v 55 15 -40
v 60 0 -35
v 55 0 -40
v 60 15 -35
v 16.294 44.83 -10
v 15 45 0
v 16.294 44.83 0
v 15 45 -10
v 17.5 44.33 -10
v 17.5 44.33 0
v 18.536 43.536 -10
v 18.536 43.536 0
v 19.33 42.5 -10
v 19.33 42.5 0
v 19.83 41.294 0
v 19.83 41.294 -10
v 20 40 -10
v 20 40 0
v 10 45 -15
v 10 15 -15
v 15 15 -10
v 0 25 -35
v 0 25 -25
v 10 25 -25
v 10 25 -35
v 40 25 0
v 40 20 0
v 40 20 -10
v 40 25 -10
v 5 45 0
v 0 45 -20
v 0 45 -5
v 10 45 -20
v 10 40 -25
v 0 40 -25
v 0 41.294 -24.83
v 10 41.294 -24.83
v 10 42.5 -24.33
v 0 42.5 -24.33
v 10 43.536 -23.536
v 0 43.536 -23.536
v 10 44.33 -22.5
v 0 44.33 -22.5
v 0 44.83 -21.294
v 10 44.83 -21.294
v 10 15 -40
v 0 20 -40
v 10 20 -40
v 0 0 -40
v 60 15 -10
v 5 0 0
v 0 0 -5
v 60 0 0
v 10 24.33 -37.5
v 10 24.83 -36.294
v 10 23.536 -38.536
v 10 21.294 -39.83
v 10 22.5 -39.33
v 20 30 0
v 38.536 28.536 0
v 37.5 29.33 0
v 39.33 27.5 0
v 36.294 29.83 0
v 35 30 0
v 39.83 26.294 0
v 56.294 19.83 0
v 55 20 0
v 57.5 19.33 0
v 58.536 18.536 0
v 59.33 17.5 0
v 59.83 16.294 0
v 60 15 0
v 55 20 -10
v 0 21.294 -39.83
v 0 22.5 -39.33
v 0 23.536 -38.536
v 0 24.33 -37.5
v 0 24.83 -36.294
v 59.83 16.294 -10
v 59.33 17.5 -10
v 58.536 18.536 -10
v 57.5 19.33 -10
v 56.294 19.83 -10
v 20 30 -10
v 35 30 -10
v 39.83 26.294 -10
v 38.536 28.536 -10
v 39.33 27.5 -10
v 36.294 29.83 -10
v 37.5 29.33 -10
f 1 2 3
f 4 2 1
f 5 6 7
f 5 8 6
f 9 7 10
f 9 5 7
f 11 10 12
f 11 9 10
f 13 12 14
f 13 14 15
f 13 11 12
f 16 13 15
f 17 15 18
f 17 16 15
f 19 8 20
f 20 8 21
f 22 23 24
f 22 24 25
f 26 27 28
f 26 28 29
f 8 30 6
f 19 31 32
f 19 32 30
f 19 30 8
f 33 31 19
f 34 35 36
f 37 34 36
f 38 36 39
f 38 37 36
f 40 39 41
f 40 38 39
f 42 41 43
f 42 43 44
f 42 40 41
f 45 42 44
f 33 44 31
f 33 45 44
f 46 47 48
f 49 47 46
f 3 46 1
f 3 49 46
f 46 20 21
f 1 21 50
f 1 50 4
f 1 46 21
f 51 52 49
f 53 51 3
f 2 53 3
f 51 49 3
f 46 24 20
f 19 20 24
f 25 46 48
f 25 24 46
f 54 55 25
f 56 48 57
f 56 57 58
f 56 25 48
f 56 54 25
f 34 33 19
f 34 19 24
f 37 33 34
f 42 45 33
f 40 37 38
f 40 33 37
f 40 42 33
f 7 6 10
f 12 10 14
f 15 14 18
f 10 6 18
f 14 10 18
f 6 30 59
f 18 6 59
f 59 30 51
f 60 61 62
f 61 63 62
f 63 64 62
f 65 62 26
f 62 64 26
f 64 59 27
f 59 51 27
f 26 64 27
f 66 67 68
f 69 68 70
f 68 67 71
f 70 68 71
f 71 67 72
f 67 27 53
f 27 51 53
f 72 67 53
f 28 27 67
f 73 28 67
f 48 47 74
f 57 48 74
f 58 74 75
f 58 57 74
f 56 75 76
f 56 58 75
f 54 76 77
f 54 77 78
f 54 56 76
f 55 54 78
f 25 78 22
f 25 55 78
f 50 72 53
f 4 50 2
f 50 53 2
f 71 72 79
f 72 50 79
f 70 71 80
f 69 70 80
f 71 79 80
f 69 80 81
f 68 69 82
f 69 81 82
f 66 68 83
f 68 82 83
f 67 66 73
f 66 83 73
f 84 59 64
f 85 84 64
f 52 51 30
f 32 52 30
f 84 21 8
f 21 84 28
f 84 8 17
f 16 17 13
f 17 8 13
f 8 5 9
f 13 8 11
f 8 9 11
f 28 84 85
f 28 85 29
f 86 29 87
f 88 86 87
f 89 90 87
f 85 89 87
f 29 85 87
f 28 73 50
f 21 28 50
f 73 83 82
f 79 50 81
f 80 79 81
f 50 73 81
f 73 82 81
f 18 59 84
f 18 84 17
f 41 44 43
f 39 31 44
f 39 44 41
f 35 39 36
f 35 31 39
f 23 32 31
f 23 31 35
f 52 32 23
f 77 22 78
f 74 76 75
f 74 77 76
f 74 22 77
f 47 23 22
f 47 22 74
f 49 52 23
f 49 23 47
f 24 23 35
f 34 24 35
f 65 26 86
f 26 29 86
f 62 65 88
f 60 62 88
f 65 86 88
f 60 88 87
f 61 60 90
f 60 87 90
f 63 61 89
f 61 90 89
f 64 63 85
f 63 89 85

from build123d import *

# Parameters (mm, degrees)
SKETCH1_W           = 60
SKETCH1_H           = 40
BOSS_EXTRUDE1_DEPTH = 45
CUT_EXTRUDE1_START  = 45
SKETCH1_3_W         = 50
SKETCH1_3_H         = 30
CUT_EXTRUDE1_DEPTH  = 30
SKETCH2_W           = 40
SKETCH2_H           = 15
SKETCH2_W_2         = 20
SKETCH2_H_2         = 10
CUT_EXTRUDE2_DEPTH  = 30
SKETCH3_W           = 15
SKETCH3_H           = 20
CUT_EXTRUDE3_DEPTH  = 30
FILLET1_R           = 5
CHAMFER2_SIZE       = 5


with BuildPart() as part:
    # Sketch1 → Boss-Extrude1 (new body)
    with BuildSketch(Plane(origin=(0, 0, 0), x_dir=(1, 0, 0), z_dir=(0, 1, 0))):
        with Locations((30, 20)):
            Rectangle(SKETCH1_W, SKETCH1_H)
    extrude(amount=BOSS_EXTRUDE1_DEPTH)

    # Sketch1<3> → Cut-Extrude1 (cut)
    with BuildSketch(Plane(origin=(0, 0, 0), x_dir=(1, 0, 0), z_dir=(0, 1, 0)).offset(CUT_EXTRUDE1_START)):
        with Locations((35, 25)):
            Rectangle(SKETCH1_3_W, SKETCH1_3_H)
    extrude(amount=-CUT_EXTRUDE1_DEPTH, mode=Mode.SUBTRACT)

    # Sketch2 → Cut-Extrude2 (cut)
    with BuildSketch(Plane.XY):
        with Locations((40, 37.5)):
            Rectangle(SKETCH2_W, SKETCH2_H)
        with Locations((50, 25)):
            Rectangle(SKETCH2_W_2, SKETCH2_H_2)
    extrude(amount=-CUT_EXTRUDE2_DEPTH, mode=Mode.SUBTRACT)

    # Sketch3 → Cut-Extrude3 (cut)
    with BuildSketch(Plane(origin=(0, 0, 0), x_dir=(0, 0, -1), z_dir=(1, 0, 0))):
        with Locations((32.5, 35)):
            Rectangle(SKETCH3_W, SKETCH3_H)
    extrude(amount=CUT_EXTRUDE3_DEPTH, mode=Mode.SUBTRACT)

    # Fillet1
    fillet1_edges = [part.edges().sort_by_distance(p)[0] for p in [
        (5, 25, -40),
        (5, 45, -25),
        (20, 45, -5),
        (40, 30, -5),
        (60, 20, -5),
    ]]
    fillet(fillet1_edges, radius=FILLET1_R)

    # Chamfer2
    chamfer2_edges = [part.edges().sort_by_distance(p)[0] for p in [
        (10, 30, -10),
        (60, 7.5, -40),
        (0, 22.5, 0),
    ]]
    chamfer(chamfer2_edges, length=CHAMFER2_SIZE)


solid = part.part
